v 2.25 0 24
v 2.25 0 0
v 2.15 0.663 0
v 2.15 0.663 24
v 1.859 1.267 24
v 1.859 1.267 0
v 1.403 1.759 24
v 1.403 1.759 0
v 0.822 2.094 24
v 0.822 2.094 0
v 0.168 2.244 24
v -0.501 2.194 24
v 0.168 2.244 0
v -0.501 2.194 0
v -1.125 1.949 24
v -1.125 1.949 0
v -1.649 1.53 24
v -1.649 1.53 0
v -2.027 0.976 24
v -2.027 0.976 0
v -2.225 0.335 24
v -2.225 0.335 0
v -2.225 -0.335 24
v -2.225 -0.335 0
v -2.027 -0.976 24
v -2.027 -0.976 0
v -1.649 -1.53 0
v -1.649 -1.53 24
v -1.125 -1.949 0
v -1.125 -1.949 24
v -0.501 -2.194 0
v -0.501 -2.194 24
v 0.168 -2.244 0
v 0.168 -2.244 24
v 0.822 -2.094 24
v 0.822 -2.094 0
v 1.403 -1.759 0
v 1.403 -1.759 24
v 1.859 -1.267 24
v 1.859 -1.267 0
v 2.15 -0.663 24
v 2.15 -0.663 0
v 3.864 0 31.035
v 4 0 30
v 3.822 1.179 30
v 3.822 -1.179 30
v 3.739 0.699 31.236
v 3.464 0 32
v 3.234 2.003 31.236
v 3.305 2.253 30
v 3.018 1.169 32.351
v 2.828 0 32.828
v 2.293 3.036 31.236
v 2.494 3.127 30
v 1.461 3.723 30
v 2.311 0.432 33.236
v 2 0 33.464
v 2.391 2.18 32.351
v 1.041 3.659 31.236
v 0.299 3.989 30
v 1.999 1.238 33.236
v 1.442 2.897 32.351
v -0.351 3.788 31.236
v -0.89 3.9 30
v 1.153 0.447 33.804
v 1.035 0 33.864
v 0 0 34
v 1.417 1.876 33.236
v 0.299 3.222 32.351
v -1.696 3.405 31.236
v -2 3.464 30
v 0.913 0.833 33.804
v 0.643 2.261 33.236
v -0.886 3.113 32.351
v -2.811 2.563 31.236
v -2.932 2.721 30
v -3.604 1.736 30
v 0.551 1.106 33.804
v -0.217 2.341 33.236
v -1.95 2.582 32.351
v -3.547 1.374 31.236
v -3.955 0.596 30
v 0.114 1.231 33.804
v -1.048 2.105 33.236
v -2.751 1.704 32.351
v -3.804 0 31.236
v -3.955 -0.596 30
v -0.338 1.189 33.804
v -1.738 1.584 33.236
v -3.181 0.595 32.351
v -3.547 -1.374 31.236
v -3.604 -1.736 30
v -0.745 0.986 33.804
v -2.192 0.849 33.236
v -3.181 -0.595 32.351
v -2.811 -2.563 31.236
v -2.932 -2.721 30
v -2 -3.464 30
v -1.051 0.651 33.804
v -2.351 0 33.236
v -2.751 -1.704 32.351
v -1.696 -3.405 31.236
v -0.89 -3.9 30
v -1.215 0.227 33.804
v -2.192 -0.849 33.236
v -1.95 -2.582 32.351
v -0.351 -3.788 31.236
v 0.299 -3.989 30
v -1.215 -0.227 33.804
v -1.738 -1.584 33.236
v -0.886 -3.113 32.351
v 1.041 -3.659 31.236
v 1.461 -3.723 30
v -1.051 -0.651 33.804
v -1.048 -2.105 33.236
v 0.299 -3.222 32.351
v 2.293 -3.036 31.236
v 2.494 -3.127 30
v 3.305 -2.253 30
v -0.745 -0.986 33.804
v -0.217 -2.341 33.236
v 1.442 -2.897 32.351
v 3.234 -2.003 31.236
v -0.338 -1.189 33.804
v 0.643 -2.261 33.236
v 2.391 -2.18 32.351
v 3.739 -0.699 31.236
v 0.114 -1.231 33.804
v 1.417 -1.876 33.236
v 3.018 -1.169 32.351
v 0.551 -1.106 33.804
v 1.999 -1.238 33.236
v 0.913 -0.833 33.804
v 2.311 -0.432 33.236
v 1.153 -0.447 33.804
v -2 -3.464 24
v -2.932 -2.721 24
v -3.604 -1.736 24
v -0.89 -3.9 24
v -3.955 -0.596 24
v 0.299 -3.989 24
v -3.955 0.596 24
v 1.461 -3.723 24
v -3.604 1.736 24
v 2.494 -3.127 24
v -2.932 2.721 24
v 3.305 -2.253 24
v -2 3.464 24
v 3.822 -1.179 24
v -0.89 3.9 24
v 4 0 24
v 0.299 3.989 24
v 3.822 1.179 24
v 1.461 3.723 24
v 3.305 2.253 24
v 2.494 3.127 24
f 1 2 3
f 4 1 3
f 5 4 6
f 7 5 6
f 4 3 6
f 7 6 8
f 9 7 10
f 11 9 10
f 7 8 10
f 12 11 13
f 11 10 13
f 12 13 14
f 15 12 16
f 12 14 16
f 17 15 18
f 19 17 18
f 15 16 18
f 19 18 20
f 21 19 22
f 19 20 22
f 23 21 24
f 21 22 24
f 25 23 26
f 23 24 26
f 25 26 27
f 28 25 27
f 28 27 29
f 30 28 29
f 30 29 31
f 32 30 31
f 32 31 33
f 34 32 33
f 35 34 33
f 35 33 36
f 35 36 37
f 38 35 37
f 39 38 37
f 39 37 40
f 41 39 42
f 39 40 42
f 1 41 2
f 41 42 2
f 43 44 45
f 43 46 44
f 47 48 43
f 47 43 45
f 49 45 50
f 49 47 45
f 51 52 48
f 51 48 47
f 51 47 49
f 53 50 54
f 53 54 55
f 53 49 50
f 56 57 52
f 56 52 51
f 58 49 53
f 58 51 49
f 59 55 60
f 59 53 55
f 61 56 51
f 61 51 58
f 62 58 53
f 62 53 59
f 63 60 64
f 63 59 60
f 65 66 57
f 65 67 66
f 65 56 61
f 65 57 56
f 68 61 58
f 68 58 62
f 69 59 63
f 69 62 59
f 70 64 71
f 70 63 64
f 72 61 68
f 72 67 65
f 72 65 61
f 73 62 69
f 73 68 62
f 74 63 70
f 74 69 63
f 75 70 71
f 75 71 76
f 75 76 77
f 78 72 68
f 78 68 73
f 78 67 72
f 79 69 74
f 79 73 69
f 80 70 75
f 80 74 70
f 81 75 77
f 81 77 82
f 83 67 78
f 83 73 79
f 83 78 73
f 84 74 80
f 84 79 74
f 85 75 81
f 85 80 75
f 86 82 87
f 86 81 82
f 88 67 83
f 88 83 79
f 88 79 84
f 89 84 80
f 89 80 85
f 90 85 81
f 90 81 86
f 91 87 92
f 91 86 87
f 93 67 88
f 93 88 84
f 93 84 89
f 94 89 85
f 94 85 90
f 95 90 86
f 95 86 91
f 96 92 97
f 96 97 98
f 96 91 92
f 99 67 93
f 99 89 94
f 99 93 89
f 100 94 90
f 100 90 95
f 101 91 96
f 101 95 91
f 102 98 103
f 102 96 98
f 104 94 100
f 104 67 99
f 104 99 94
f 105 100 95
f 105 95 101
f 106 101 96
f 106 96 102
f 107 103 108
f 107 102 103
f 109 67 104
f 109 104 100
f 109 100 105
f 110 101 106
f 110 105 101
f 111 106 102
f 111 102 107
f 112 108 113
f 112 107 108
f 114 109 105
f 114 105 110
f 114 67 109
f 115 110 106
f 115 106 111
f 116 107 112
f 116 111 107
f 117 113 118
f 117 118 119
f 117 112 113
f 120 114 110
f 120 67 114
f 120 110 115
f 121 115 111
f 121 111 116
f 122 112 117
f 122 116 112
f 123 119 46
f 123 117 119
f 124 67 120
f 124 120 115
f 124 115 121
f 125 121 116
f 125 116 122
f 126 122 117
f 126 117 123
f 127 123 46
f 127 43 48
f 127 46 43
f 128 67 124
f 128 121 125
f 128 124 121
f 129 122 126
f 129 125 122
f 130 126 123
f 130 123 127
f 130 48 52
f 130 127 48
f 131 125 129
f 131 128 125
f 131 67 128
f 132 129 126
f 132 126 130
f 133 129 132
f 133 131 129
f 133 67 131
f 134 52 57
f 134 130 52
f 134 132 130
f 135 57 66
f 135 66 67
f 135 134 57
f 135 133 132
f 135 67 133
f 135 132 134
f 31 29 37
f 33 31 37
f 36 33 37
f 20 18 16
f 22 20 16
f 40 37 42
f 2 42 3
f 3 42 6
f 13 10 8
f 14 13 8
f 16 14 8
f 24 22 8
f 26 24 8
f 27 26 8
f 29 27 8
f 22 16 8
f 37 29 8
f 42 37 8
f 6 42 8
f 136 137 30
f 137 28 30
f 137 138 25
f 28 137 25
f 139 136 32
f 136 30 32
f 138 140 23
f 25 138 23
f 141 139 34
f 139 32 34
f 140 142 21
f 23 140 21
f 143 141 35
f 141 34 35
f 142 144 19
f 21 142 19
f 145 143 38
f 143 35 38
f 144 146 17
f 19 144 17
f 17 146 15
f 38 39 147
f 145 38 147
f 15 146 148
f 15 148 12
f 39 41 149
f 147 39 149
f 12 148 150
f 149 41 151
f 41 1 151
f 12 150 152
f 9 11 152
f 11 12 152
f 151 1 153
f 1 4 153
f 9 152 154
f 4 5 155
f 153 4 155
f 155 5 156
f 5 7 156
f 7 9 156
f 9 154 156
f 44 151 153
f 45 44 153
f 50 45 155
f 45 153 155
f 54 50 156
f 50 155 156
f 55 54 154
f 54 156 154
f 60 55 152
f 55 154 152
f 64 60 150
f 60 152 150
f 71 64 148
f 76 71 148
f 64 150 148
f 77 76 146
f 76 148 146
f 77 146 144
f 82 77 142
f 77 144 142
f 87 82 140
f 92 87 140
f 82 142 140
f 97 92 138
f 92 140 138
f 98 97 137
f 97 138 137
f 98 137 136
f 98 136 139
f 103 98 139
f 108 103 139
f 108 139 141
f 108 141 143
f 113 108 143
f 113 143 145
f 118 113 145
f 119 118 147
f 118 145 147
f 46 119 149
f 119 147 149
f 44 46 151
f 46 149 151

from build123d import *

# Parameters (mm, degrees)
F0_R     = 2.25
F1_DEPTH = 24
F2_R     = 4
F2_R_2   = 2.25
F3_DEPTH = 10
F4_R     = 4


with BuildPart() as f1:
    # F0 (on Top) → F1 (new body)
    with BuildSketch(Plane.XY):
        Circle(F0_R)
    extrude(amount=F1_DEPTH)

    # F2 (on face) → F3 (join)
    with BuildSketch(Plane.XY.offset(24)):
        Circle(F2_R)
        Circle(F2_R_2, mode=Mode.SUBTRACT)
        Circle(F2_R_2)
    extrude(amount=F3_DEPTH)

    # F4
    f4_edges = [f1.edges().sort_by_distance(p)[0] for p in [
        (-4, 0, 34),
    ]]
    fillet(f4_edges, radius=F4_R)


solid = f1.part
